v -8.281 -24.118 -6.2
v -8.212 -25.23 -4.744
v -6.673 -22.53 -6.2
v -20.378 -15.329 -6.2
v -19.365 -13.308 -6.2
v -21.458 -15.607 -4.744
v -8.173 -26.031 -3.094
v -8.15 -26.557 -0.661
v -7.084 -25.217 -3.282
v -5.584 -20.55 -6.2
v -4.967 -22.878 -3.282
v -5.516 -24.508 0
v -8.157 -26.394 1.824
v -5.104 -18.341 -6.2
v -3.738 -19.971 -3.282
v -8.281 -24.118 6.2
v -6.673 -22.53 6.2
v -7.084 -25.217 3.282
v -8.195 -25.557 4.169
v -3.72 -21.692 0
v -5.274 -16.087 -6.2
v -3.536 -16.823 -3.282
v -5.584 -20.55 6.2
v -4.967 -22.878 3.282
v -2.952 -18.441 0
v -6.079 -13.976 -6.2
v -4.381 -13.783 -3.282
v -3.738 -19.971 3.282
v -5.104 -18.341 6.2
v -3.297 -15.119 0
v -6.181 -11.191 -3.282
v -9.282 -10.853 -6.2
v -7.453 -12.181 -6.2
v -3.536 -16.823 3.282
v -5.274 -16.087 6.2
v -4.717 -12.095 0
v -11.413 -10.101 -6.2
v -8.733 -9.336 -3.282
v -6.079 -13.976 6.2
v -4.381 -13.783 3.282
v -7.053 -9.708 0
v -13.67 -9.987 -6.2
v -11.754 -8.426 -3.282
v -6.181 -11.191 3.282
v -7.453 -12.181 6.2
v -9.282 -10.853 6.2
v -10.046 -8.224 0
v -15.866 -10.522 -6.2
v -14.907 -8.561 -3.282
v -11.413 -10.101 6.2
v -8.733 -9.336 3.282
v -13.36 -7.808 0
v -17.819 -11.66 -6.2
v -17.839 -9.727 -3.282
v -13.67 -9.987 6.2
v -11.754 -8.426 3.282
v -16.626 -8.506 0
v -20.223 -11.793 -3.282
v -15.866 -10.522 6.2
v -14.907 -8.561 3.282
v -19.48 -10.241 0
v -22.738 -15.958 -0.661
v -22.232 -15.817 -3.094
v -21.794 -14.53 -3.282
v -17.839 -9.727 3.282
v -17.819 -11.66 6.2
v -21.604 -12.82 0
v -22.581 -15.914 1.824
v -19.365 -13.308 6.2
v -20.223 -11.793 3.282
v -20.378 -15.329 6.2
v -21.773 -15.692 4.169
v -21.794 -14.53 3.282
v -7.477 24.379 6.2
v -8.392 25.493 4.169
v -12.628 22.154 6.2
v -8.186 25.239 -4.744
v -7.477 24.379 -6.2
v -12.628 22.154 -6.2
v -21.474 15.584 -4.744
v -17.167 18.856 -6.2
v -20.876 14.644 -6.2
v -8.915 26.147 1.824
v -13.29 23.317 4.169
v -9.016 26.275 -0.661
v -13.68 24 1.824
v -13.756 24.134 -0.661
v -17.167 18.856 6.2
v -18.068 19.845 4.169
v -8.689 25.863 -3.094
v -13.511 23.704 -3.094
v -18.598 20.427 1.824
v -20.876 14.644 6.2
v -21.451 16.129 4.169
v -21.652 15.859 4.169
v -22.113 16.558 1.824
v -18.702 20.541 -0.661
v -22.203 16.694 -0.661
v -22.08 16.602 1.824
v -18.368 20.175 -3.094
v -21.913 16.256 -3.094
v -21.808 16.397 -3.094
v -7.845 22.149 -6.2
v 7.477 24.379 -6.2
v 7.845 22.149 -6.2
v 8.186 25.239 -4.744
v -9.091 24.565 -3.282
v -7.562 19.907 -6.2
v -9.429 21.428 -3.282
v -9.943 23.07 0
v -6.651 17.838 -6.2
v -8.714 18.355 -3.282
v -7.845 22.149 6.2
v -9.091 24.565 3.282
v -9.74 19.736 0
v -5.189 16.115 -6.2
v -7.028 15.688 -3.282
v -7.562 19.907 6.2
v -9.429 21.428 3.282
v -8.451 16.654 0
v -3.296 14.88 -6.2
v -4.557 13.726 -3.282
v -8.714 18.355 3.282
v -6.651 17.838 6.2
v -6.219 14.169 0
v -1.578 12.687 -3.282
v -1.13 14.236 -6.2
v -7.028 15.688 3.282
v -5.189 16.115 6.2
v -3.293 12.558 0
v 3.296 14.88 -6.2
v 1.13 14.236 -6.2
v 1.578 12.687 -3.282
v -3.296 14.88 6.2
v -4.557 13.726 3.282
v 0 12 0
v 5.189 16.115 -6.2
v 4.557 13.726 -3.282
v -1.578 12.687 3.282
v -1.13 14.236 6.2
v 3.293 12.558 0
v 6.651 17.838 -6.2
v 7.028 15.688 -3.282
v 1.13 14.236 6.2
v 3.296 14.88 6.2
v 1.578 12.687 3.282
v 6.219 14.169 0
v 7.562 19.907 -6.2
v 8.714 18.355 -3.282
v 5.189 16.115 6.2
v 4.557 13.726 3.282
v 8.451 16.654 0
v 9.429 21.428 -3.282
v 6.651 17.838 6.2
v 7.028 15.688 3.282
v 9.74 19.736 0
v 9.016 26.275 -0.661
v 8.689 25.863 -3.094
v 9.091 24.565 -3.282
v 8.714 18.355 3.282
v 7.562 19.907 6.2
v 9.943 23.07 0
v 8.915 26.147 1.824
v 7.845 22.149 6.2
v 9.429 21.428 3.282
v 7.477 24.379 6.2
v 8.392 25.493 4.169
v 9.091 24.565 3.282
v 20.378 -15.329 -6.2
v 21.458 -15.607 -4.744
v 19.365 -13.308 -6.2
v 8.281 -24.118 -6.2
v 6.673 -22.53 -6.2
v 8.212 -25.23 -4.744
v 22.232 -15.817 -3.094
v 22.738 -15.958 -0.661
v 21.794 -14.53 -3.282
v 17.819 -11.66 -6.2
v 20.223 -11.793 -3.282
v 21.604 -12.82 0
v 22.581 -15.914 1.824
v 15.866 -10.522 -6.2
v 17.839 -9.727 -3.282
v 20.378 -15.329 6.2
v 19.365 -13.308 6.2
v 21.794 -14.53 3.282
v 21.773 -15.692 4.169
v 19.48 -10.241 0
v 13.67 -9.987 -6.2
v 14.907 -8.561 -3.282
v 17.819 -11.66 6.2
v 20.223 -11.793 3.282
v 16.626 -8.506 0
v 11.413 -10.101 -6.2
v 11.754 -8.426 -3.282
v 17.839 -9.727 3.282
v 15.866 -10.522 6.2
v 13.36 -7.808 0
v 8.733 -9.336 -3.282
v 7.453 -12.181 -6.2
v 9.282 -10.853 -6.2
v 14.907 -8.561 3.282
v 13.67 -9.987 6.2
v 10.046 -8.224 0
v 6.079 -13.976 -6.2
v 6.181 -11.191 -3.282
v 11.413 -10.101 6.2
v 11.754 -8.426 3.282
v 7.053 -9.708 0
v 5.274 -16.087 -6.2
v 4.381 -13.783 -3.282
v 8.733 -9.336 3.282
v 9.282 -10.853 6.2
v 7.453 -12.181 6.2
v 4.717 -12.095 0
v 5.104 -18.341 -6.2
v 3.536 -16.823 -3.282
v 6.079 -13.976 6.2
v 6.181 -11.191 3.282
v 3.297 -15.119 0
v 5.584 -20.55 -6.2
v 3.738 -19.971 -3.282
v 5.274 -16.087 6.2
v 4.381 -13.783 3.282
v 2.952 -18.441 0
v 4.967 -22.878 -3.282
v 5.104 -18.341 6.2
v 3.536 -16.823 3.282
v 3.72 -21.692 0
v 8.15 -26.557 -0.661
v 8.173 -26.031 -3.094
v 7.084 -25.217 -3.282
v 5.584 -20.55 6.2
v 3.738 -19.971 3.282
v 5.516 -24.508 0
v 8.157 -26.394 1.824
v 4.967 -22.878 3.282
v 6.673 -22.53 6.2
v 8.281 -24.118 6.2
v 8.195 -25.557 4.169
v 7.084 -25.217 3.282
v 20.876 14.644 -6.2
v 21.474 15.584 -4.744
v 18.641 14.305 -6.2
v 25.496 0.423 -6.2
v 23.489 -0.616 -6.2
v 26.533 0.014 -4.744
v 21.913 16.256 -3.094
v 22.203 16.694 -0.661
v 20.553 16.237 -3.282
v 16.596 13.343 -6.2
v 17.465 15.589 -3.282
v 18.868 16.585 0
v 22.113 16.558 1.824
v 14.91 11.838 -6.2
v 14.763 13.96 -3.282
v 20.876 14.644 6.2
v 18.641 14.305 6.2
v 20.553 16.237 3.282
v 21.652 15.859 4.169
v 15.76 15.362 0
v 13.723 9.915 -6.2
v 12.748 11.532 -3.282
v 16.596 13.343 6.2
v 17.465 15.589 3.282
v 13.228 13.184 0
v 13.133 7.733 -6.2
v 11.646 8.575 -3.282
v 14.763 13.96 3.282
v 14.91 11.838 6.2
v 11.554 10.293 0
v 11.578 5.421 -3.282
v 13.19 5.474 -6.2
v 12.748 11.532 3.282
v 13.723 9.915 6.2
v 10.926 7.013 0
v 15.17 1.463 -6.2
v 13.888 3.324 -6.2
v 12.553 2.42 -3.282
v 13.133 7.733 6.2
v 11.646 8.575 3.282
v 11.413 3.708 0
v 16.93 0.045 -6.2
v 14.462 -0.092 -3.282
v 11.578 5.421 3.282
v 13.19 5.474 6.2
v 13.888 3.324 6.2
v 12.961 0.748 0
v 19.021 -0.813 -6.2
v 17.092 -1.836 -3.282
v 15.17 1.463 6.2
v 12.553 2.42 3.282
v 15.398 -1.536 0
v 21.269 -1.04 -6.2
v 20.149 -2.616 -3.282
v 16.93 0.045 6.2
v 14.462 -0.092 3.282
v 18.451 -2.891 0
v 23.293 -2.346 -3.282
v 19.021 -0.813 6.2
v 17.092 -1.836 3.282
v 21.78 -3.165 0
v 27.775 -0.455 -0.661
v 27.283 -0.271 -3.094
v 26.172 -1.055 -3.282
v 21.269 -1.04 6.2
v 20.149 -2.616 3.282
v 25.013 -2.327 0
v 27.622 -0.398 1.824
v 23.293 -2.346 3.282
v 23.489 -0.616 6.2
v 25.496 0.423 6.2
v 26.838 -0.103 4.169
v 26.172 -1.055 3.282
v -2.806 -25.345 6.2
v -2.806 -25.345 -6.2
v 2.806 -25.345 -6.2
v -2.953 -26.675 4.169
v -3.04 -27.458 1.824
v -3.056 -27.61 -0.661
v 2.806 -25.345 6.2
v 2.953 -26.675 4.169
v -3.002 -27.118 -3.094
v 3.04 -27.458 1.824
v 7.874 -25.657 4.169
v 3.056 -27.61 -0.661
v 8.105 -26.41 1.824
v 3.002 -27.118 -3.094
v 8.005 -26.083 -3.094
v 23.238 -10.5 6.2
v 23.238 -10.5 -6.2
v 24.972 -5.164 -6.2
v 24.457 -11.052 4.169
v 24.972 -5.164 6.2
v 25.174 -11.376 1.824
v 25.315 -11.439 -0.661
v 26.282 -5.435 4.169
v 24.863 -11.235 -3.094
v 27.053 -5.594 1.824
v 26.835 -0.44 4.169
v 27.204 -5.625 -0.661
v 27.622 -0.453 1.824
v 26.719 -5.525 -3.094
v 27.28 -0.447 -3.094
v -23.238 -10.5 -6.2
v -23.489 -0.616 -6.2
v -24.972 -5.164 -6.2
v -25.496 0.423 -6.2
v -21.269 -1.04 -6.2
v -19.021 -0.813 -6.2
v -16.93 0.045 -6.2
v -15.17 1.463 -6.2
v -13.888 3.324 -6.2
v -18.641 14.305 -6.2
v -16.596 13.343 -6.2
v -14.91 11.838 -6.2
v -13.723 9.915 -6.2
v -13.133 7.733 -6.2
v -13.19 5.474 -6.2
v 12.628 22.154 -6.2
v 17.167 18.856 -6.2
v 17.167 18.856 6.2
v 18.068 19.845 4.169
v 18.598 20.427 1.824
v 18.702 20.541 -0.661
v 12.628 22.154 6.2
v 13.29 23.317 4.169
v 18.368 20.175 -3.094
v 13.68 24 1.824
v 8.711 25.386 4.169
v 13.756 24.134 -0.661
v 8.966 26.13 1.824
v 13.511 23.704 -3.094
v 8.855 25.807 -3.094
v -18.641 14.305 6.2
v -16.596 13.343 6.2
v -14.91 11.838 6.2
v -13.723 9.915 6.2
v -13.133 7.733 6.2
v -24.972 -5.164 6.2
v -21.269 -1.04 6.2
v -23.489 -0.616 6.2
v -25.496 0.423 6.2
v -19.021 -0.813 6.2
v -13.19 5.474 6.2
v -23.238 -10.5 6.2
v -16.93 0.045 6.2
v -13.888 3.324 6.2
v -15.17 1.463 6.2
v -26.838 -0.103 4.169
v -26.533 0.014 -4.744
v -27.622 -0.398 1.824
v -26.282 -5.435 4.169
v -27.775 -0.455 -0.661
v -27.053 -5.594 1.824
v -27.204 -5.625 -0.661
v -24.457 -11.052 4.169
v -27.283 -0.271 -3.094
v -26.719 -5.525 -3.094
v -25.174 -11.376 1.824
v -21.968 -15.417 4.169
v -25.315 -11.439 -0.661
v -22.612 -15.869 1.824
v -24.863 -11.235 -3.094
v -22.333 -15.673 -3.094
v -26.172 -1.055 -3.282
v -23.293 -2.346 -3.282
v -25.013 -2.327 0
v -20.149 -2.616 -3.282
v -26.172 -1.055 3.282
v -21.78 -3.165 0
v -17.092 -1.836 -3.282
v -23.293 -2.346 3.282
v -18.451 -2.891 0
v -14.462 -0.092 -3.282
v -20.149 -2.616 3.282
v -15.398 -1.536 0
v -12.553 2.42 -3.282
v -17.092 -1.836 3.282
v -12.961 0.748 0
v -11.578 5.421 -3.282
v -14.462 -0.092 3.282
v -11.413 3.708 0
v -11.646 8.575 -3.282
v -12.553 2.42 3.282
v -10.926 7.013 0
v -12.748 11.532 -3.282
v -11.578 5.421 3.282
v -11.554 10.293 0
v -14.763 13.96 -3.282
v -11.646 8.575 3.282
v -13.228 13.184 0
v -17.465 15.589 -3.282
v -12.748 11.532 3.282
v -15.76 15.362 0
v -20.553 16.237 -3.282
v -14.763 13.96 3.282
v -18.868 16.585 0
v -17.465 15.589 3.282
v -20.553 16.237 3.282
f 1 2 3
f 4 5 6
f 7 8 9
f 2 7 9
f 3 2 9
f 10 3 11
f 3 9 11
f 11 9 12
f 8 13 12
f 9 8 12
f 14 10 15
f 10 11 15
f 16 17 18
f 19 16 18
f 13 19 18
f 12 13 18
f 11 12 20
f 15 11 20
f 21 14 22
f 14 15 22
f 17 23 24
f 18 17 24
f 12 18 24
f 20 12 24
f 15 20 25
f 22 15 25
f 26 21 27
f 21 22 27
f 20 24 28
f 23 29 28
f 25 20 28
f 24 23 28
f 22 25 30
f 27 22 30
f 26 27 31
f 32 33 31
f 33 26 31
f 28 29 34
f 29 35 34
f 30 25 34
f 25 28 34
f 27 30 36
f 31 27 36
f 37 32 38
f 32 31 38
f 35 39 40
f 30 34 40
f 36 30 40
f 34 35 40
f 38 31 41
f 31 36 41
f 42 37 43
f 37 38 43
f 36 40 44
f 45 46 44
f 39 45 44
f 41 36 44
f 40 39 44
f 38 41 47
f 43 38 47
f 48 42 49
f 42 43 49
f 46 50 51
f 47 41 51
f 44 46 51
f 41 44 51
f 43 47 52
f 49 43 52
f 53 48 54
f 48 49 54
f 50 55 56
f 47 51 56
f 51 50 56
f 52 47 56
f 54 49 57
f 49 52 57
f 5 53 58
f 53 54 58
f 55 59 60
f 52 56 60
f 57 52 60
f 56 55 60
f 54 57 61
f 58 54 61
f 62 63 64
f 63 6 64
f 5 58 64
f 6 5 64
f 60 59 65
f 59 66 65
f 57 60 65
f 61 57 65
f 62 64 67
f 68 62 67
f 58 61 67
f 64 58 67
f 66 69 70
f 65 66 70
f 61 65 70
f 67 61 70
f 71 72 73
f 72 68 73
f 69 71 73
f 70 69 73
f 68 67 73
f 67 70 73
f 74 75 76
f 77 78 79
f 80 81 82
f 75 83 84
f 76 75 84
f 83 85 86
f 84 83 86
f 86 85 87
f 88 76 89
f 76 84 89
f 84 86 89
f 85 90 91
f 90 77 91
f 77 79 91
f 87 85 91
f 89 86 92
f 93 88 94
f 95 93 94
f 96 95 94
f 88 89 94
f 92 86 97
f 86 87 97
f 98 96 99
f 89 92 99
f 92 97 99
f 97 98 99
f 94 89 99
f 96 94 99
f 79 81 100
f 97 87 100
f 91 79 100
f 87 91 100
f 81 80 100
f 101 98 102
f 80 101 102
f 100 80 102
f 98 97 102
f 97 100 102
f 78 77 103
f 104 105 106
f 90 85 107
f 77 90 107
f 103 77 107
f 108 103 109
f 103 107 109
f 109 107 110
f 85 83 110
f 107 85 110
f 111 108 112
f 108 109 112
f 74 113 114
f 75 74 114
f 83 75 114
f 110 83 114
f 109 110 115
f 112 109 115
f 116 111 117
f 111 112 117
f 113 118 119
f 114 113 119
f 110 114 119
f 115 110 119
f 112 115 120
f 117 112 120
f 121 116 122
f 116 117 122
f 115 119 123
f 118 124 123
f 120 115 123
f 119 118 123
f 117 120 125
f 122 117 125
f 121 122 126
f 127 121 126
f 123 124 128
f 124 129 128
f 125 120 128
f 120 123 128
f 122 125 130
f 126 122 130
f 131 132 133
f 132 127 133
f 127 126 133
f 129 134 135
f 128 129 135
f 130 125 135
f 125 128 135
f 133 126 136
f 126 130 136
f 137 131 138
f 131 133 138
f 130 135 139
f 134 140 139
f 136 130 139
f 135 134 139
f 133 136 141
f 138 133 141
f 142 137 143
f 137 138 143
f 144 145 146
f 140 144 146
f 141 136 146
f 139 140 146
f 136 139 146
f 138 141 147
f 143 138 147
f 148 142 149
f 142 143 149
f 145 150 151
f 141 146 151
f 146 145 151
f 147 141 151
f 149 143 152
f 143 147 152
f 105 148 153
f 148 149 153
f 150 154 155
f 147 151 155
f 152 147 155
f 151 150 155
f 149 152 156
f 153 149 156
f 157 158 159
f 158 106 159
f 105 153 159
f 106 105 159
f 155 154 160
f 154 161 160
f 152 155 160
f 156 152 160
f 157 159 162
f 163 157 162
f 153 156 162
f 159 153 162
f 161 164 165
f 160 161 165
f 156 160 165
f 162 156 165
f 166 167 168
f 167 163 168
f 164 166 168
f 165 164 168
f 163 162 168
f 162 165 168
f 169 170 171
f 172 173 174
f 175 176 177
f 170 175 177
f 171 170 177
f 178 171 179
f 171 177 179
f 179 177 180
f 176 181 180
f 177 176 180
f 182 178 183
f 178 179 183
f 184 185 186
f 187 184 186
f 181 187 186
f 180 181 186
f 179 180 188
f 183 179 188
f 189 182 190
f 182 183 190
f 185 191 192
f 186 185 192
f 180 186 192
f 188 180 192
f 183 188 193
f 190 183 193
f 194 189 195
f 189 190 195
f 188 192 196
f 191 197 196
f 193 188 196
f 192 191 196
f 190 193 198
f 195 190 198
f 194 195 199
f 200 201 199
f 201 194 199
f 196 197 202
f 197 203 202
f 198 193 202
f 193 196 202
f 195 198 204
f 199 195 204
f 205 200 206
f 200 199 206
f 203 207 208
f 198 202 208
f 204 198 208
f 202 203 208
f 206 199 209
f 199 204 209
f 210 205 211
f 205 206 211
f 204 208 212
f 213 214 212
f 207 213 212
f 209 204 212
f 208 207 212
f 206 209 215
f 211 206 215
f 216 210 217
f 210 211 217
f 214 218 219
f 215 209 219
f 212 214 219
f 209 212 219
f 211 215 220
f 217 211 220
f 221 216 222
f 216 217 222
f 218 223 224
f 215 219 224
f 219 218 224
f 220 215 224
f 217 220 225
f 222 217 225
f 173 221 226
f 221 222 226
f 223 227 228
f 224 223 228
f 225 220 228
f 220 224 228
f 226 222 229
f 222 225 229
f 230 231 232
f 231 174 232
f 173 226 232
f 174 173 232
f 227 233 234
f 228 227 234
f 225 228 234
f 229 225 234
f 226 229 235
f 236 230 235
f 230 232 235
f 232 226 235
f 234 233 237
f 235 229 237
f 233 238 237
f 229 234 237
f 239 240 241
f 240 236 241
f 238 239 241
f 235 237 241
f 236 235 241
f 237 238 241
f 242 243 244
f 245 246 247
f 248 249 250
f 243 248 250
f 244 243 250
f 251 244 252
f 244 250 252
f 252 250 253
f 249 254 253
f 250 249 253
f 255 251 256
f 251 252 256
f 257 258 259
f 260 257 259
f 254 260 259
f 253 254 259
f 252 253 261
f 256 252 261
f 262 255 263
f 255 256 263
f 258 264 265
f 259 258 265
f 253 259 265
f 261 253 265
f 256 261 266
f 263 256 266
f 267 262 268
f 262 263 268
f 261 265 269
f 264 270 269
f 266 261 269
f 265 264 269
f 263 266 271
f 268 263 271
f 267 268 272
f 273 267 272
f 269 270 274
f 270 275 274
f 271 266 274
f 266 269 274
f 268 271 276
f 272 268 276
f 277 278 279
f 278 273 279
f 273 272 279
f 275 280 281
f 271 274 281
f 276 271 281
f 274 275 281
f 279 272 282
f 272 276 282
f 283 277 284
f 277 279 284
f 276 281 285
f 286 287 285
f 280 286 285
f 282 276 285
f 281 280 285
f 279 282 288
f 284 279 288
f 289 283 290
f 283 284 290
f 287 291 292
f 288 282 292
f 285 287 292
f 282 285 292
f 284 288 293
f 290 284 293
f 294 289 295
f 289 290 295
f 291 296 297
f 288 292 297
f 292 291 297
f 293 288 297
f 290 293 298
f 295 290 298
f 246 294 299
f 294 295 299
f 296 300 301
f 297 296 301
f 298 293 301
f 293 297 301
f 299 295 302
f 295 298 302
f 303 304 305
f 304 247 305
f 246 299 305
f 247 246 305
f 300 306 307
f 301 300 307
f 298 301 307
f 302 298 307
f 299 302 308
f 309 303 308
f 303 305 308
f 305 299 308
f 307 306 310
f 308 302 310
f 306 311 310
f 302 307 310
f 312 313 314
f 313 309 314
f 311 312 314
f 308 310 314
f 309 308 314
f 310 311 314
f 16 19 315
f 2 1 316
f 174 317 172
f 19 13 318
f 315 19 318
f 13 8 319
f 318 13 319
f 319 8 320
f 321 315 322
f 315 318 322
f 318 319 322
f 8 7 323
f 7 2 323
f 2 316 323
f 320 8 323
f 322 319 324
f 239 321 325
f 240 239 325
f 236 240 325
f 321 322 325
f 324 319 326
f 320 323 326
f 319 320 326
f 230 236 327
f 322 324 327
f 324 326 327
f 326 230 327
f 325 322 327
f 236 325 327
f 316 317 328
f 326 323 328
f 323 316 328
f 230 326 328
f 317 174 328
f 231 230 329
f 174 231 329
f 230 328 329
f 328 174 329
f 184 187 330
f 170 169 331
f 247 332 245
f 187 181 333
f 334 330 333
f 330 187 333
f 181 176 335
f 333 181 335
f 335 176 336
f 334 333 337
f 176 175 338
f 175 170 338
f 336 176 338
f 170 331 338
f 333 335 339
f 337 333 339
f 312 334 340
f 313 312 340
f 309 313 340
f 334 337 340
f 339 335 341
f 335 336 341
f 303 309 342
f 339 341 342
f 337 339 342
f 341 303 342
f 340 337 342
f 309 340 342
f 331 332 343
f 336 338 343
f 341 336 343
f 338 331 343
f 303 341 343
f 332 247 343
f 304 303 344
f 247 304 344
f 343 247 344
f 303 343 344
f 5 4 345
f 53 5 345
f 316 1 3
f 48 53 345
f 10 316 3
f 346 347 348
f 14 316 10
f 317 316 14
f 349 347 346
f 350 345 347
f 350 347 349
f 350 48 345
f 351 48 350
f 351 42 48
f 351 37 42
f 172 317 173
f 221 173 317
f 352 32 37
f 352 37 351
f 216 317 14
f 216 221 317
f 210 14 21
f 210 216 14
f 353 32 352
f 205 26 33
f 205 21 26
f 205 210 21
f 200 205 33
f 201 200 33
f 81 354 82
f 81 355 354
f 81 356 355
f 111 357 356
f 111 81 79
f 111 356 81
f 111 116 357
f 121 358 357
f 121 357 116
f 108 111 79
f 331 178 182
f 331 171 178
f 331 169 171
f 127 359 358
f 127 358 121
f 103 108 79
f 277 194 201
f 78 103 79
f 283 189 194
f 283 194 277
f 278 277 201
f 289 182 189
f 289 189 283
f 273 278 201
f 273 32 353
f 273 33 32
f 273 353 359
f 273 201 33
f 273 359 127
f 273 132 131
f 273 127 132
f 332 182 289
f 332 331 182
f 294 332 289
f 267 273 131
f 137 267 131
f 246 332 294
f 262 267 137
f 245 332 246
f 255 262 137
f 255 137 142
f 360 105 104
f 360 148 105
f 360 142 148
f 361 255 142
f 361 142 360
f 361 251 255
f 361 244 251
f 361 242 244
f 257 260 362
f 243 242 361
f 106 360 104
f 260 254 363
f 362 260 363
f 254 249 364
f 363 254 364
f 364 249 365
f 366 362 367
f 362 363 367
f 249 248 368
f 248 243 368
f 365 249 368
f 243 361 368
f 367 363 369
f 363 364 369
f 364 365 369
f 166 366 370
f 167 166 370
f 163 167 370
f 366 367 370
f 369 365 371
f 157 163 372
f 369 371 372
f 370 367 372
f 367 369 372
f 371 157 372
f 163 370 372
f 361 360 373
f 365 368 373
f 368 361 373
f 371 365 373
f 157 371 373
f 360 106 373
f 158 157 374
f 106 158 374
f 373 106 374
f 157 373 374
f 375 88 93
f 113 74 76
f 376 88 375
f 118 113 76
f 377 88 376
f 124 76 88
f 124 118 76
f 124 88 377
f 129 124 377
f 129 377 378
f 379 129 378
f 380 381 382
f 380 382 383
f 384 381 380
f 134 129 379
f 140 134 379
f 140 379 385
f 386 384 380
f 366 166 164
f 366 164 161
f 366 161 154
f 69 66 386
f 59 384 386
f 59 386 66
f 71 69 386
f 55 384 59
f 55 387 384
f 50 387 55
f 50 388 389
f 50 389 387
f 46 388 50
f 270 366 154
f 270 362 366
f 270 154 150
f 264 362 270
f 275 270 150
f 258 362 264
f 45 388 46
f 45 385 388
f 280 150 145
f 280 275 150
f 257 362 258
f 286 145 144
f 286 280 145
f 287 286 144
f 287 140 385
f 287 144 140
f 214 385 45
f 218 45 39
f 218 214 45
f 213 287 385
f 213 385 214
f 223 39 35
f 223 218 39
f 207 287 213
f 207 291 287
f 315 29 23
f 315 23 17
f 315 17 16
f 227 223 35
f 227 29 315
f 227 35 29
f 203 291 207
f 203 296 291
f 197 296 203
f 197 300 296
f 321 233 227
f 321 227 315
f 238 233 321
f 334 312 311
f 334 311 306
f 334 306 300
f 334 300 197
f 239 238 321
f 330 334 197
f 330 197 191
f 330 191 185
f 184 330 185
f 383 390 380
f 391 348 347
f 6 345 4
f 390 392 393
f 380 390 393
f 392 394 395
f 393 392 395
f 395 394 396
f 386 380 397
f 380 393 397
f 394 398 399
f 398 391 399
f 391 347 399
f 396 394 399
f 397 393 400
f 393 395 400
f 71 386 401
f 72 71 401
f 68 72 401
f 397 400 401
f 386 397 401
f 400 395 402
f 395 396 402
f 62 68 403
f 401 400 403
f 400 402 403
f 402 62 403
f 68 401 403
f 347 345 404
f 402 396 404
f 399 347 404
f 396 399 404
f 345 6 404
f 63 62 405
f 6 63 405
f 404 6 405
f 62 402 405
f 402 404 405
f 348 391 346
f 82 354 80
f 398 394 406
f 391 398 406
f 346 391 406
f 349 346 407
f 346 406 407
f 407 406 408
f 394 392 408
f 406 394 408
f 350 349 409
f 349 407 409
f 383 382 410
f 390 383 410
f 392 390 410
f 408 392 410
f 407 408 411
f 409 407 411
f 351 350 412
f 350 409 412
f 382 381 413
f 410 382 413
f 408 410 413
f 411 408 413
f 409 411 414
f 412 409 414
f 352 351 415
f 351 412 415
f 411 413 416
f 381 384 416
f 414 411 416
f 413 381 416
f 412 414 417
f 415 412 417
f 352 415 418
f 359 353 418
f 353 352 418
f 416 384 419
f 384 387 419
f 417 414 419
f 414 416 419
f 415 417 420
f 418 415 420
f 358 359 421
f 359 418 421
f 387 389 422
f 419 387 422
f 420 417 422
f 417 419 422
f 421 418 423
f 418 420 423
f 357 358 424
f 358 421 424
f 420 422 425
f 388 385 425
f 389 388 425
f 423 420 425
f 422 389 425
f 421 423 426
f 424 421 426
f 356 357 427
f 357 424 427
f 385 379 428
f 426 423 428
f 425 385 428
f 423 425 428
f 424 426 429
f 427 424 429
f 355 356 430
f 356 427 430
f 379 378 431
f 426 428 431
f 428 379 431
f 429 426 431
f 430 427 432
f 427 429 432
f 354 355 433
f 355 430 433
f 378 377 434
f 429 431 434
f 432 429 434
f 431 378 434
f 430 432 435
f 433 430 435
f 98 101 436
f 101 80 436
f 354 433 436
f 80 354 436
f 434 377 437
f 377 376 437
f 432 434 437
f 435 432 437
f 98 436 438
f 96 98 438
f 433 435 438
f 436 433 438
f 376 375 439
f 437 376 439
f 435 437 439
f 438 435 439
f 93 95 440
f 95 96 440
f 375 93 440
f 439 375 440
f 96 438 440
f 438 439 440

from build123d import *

# Parameters (mm, degrees)
ARRAY_COUNT = 5


with BuildPart() as spheres:
    # Sphere → Sphere (revolve)
    with BuildSketch(Plane.XZ.offset(-22)):
        with BuildLine():
            ThreePointArc((0, -10), (10, 0), (0, 10))
            Line((0, 10), (0, -10))
        make_face()
    revolve(axis=Axis((0, 22, 0), (0, 0, 1)))

    # Array: spheres ×5 about axis
    array_axis = Axis((0, 0, 0), (0, 0, 1))


with BuildPart() as spheres_1:
    add(spheres.part)
    for i in range(1, ARRAY_COUNT):
        add(spheres.part.rotate(array_axis, i * 360 / ARRAY_COUNT))


with BuildPart() as hub_parametric:
    # Sketch → Revolution (revolve)
    with BuildSketch(Plane.YZ):
        with BuildLine():
            Line((-25.5, 6.2), (0, 6.2))
            Line((0, -6.2), (0, 6.2))
            Line((0, -6.2), (-25.5, -6.2))
            ThreePointArc((-25.5, 6.2), (-27.802084, 0), (-25.5, -6.2))
        make_face()
    revolve(axis=Axis((0, 0, 0), (0, 0, 1)))

    # Cut: cut spheres
    add(spheres_1.part, mode=Mode.SUBTRACT)


solid = hub_parametric.part
